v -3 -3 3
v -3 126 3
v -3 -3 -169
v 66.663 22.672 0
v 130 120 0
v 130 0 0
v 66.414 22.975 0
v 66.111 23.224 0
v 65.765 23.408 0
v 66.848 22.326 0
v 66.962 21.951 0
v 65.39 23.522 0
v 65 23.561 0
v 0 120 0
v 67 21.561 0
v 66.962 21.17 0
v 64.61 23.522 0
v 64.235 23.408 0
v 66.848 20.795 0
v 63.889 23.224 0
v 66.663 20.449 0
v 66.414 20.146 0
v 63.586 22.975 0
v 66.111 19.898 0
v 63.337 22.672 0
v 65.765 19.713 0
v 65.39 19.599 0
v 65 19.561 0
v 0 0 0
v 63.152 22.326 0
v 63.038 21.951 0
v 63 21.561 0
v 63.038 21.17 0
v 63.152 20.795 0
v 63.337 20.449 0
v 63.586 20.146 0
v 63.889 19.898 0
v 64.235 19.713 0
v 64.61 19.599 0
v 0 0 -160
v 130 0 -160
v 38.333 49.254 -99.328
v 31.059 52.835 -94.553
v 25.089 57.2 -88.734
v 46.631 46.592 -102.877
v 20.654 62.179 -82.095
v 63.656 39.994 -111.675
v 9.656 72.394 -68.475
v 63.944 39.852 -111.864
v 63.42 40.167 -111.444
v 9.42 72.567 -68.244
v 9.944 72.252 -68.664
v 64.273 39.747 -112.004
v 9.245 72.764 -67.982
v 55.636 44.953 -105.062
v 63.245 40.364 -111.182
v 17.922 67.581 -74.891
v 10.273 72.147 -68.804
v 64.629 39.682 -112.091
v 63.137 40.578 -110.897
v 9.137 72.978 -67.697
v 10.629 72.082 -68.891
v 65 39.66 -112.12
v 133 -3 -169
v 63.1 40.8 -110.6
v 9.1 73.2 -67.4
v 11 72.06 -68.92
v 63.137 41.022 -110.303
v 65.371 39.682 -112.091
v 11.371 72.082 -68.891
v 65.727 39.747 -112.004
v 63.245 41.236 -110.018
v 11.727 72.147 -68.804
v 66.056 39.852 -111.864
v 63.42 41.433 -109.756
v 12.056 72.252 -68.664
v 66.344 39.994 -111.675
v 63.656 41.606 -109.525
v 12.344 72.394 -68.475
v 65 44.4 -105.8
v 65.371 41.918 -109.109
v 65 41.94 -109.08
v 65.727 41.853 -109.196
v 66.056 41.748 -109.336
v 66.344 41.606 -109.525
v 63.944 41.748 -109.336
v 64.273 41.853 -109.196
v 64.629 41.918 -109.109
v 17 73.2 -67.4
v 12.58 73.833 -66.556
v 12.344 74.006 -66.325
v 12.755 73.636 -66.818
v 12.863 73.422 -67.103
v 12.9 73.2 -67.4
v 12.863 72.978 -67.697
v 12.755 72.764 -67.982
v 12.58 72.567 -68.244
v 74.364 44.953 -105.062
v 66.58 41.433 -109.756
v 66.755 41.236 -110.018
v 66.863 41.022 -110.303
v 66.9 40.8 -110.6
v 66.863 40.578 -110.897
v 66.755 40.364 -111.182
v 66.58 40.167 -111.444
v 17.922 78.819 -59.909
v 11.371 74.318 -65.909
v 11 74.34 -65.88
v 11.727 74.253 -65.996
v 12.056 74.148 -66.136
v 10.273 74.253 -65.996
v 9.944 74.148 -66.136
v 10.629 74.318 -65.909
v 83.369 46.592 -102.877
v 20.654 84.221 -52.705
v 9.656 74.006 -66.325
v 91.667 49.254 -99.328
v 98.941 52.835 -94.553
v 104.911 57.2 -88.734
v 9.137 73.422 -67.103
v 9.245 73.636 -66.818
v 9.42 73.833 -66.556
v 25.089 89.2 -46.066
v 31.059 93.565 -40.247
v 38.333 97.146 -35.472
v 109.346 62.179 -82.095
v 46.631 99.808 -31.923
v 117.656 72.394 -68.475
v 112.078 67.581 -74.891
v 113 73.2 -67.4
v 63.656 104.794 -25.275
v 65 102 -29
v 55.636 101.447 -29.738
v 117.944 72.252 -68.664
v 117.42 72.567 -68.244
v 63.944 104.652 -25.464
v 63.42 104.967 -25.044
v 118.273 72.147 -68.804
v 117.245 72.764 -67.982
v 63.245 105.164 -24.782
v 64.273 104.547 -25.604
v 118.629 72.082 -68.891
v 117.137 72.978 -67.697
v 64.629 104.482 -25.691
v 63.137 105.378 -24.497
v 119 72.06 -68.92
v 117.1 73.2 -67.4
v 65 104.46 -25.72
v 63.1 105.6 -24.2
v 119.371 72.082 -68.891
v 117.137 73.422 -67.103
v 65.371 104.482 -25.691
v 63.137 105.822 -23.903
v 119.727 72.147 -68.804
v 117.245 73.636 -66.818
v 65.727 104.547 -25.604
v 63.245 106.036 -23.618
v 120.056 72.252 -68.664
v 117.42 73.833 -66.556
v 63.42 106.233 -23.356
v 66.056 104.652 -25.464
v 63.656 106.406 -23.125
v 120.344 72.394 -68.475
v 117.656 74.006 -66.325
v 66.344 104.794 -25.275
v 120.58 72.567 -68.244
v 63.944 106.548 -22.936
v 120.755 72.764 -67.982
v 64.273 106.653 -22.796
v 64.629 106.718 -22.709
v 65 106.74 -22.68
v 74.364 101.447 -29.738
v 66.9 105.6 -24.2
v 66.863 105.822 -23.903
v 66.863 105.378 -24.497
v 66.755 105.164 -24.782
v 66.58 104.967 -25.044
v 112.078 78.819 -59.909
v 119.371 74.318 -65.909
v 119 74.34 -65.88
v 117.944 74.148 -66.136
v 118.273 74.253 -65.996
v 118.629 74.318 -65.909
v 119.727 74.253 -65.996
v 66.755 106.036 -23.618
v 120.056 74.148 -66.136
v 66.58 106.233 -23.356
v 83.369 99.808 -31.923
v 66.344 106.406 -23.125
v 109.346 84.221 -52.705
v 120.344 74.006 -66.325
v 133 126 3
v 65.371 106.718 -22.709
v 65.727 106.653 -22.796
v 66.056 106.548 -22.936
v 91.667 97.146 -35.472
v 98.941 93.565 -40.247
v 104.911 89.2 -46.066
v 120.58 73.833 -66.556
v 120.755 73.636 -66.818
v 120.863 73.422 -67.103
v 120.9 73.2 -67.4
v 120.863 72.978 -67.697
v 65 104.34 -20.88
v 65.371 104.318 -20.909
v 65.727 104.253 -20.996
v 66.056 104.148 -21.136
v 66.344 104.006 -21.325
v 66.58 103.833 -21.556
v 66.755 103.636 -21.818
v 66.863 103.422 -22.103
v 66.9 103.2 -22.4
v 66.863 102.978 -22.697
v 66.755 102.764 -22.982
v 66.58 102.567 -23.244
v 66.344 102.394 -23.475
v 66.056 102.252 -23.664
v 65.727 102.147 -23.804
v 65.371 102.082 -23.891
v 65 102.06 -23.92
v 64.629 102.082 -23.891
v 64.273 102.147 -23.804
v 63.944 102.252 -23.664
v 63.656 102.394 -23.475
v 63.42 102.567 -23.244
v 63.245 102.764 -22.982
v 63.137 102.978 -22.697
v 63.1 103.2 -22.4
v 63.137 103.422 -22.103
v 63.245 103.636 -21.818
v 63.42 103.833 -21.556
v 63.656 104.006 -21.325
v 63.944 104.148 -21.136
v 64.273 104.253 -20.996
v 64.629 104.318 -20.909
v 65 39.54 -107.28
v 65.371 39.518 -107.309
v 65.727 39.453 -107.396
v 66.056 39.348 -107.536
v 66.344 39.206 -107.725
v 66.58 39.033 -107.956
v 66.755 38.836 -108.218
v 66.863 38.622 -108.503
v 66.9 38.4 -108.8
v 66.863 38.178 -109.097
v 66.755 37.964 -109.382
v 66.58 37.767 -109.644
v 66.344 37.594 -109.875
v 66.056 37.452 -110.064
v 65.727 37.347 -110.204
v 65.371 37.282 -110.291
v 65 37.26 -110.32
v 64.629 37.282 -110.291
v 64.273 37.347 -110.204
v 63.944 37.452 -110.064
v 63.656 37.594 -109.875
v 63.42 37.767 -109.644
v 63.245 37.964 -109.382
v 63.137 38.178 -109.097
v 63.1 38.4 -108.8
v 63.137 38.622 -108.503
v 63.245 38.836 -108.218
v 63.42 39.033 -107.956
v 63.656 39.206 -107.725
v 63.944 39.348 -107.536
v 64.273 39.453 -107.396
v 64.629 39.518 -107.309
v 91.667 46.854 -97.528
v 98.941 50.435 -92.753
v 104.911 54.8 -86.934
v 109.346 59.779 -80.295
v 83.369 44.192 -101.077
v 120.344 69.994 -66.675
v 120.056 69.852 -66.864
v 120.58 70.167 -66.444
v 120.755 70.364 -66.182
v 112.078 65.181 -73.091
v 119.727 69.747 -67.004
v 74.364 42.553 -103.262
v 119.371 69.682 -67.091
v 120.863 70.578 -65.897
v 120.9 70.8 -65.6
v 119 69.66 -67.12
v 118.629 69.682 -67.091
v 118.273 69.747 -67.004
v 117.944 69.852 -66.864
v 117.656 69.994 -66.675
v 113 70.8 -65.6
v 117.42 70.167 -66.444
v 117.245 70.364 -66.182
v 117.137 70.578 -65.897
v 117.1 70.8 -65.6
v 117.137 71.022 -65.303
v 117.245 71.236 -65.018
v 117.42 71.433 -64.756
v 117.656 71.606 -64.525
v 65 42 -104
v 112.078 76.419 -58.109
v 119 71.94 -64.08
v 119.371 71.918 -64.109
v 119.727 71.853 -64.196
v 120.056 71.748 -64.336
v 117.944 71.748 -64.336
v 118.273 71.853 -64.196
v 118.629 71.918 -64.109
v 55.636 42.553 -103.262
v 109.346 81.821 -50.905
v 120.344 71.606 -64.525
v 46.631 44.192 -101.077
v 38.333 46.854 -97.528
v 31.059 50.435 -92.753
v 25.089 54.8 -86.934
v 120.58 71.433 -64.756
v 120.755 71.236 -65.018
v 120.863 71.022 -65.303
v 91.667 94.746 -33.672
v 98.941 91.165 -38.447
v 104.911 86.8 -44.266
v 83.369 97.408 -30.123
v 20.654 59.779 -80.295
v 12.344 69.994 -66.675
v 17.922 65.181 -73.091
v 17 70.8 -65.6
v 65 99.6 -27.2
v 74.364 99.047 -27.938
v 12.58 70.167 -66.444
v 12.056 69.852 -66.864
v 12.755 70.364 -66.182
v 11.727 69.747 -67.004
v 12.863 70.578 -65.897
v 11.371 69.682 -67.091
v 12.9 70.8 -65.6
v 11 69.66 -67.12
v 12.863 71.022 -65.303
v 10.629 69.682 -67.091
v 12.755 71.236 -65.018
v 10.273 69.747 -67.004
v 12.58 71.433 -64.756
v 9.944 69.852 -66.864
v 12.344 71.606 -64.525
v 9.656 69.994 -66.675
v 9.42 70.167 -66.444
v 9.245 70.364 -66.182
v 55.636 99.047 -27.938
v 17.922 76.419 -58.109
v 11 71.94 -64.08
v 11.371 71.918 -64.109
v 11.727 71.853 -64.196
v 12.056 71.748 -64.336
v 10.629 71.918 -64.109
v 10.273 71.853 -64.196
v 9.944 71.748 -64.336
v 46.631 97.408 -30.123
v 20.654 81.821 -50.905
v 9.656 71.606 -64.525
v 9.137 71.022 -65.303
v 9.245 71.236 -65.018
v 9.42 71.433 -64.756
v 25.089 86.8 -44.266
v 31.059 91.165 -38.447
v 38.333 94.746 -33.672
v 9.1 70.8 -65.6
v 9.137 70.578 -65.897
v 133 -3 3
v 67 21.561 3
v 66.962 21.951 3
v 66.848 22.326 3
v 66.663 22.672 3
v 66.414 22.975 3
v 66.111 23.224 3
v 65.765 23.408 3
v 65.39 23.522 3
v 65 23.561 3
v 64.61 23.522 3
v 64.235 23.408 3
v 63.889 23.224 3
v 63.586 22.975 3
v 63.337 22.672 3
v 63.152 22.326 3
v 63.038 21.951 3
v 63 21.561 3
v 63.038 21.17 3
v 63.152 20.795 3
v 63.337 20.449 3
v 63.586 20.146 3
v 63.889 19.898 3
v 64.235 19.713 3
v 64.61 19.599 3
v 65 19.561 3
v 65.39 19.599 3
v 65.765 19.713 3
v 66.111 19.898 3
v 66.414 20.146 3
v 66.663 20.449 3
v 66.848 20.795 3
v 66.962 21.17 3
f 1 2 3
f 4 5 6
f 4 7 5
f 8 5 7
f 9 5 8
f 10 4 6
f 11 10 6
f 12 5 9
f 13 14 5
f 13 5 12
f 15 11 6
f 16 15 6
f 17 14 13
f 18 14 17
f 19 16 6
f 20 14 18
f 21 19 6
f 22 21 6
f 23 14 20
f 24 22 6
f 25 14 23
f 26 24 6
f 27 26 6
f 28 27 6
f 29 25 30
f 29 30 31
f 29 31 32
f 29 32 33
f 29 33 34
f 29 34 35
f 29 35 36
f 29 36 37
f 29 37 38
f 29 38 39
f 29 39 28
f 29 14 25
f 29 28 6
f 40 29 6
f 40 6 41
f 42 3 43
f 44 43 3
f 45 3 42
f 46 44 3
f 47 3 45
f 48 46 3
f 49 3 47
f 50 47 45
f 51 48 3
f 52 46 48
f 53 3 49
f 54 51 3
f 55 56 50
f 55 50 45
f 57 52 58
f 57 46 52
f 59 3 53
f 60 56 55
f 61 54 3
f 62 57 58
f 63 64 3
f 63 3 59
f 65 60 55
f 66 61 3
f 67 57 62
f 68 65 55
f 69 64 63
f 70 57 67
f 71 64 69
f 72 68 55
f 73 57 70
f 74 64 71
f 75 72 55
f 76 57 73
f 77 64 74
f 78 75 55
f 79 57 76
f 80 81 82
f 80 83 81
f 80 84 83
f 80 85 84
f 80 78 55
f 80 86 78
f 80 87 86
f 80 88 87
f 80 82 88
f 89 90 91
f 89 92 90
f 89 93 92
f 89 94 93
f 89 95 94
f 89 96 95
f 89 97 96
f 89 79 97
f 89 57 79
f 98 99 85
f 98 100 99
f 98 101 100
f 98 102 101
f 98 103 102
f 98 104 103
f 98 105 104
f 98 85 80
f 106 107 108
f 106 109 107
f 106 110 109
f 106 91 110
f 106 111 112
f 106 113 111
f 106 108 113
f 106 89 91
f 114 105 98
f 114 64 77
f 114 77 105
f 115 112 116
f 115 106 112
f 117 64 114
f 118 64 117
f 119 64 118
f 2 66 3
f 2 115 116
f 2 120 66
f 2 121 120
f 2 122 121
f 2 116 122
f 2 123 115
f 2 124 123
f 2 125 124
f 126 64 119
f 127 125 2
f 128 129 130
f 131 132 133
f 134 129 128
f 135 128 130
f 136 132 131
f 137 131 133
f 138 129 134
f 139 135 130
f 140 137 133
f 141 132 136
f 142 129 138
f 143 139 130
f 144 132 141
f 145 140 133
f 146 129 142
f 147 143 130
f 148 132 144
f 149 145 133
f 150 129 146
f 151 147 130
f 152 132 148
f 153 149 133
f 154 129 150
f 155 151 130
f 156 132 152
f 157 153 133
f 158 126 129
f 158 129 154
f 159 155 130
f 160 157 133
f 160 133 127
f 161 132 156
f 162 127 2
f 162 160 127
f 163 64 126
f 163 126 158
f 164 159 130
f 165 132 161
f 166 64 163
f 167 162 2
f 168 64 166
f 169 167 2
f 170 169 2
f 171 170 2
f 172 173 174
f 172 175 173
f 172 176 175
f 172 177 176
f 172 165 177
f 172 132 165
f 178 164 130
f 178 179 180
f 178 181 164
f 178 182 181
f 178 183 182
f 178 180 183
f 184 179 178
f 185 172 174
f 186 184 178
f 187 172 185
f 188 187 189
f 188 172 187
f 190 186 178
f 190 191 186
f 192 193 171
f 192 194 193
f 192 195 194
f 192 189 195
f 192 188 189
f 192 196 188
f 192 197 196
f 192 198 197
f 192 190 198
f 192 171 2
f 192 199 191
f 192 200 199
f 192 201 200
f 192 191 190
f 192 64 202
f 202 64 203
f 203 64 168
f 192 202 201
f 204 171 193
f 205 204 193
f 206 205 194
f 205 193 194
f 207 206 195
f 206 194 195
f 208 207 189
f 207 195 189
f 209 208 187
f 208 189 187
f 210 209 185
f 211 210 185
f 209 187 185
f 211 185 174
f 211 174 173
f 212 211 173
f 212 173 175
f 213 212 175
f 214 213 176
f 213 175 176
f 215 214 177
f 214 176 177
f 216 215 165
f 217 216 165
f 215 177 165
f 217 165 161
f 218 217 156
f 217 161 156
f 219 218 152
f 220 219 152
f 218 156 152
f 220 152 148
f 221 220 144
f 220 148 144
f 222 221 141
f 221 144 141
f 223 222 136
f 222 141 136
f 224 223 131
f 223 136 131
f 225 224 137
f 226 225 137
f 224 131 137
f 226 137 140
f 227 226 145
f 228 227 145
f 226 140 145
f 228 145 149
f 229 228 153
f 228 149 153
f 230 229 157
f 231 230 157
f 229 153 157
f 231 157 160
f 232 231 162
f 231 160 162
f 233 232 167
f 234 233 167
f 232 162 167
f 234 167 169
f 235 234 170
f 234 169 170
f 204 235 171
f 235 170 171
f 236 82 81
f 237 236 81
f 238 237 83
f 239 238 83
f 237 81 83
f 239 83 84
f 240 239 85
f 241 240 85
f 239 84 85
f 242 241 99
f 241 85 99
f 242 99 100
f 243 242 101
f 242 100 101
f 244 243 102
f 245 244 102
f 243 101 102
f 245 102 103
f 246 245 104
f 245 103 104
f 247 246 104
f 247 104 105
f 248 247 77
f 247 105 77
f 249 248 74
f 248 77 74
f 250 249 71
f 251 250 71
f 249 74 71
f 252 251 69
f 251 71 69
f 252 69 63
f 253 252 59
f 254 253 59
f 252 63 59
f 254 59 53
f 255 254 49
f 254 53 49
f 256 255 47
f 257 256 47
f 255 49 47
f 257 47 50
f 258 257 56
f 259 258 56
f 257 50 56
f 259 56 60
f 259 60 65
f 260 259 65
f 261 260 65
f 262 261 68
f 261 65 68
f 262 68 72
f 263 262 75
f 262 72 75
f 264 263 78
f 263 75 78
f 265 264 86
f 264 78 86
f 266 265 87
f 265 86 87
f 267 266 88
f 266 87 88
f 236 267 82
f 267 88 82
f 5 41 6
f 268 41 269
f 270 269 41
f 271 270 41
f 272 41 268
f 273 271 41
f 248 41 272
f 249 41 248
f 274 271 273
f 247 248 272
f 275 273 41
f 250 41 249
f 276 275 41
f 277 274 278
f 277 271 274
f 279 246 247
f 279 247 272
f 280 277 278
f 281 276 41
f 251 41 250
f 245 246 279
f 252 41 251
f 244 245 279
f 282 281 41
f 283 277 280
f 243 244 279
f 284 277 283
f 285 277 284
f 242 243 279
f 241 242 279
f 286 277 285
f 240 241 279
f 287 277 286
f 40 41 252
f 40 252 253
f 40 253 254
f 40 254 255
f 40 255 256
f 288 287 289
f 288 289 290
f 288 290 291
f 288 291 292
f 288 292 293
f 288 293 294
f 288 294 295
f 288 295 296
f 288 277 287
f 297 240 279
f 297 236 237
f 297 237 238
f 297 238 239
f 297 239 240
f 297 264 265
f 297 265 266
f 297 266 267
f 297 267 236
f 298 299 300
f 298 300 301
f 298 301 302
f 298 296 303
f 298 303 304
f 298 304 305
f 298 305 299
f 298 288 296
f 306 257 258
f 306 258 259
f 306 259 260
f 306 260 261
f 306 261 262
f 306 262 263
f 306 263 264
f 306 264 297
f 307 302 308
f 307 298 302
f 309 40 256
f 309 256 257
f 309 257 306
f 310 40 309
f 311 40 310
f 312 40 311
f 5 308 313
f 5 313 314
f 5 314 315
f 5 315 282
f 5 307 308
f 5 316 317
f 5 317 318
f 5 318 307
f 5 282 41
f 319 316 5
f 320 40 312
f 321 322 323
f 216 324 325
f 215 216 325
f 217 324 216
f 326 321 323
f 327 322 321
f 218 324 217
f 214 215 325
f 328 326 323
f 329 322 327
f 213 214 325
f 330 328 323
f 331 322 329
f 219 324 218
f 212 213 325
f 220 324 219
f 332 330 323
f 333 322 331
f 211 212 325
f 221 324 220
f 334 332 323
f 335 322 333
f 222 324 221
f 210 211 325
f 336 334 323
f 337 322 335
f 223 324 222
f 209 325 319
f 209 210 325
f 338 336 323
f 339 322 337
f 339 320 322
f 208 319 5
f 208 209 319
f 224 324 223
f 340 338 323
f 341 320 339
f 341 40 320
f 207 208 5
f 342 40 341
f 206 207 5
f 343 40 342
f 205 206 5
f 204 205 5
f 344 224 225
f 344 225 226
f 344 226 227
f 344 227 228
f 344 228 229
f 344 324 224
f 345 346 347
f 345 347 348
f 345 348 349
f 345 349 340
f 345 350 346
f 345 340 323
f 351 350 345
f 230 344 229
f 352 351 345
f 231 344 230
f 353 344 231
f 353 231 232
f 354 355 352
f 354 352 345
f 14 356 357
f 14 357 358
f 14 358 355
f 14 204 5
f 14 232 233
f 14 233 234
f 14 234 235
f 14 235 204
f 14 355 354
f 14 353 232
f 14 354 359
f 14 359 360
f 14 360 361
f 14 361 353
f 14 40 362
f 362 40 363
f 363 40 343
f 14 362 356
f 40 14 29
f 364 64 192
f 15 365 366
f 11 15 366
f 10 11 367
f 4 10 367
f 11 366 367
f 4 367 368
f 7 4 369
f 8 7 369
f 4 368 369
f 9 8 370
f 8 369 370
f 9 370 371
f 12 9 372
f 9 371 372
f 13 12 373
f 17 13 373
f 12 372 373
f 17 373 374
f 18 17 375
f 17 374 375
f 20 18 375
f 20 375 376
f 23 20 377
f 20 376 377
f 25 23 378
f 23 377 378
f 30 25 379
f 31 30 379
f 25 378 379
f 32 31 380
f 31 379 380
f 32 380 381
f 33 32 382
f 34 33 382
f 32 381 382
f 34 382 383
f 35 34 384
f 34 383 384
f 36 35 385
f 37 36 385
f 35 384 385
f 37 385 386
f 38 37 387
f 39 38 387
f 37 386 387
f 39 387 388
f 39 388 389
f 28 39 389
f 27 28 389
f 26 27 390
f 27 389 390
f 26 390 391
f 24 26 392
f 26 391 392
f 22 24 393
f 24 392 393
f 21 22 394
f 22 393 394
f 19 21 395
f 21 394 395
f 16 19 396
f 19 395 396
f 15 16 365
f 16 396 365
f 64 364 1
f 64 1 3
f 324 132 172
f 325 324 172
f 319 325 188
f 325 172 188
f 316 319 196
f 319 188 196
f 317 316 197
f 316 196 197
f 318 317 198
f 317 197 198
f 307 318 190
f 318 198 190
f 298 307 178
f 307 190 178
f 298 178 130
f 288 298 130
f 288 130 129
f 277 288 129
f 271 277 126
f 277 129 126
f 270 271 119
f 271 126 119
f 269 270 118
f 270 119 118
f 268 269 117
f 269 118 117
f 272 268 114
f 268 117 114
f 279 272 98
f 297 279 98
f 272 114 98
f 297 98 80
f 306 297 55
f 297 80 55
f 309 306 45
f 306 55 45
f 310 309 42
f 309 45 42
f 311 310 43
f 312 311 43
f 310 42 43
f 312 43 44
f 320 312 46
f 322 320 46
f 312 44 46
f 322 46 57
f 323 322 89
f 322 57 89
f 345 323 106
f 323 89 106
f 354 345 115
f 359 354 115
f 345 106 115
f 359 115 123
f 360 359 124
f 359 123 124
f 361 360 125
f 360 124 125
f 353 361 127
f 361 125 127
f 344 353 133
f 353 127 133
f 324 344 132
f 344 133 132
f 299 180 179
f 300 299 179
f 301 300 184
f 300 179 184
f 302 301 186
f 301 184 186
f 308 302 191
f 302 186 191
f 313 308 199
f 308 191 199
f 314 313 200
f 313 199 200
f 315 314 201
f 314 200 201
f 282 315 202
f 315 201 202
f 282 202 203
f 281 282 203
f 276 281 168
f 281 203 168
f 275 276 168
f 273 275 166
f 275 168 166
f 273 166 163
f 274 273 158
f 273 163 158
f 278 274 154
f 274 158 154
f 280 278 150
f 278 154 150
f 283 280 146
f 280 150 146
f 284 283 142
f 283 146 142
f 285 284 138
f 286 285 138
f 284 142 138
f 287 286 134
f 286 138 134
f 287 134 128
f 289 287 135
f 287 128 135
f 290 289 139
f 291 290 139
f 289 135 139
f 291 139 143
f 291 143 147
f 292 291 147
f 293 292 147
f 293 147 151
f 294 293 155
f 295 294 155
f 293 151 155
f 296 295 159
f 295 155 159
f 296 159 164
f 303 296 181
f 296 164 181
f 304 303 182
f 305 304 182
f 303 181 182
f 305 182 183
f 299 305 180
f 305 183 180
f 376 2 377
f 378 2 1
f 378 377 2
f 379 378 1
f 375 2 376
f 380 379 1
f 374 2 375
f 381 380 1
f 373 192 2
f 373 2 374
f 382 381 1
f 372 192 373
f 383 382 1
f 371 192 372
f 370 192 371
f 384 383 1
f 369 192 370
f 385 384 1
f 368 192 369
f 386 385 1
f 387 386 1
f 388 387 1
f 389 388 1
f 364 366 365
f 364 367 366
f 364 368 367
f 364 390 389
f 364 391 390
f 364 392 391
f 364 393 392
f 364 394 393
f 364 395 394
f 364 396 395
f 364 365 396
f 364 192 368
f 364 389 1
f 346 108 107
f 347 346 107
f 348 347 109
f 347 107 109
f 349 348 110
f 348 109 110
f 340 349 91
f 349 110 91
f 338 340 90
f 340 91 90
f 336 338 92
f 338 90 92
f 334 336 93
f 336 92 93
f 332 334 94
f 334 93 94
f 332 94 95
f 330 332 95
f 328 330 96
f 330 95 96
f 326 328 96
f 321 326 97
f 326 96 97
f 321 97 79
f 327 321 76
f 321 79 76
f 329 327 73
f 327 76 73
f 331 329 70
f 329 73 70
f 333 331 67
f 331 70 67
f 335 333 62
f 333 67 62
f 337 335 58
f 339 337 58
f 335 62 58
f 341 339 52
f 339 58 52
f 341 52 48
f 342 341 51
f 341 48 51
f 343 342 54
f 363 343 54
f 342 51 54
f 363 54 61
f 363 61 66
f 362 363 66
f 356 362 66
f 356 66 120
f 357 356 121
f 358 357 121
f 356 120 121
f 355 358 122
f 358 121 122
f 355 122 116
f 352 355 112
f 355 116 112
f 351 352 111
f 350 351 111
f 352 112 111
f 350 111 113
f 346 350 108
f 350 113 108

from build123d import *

# Parameters (mm, degrees)
BOSS_EXTRUDE1_DEPTH = 130
SKETCH2_R           = 48
CUT_EXTRUDE1_DEPTH  = 3
SKETCH3_R           = 1.9
CUT_EXTRUDE2_DEPTH  = 3
BOSS_EXTRUDE2_DEPTH = 3
BOSS_EXTRUDE3_DEPTH = 3
SKETCH6_R           = 2
CUT_EXTRUDE3_DEPTH  = 3


with BuildPart() as part:
    # Sketch1 → Boss-Extrude1 (new body)
    with BuildSketch(Plane(origin=(0, 0, 0), x_dir=(0, 0, -1), z_dir=(1, 0, 0))):
        Polygon((-3, 126), (169, -3), (-3, -3), align=None)
        Polygon((0, 0), (160, 0), (0, 120), align=None, mode=Mode.SUBTRACT)
    extrude(amount=BOSS_EXTRUDE1_DEPTH)

    # Sketch2 → Cut-Extrude1 (cut)
    with BuildSketch(Plane(origin=(0, 79.2, -59.4), x_dir=(1, 0, 0), z_dir=(0, 0.7999999999999998, -0.6000000000000002))):
        with Locations(Location((65, 10, 0), (0, 0, 270))):
            Circle(SKETCH2_R)
    extrude(amount=-CUT_EXTRUDE1_DEPTH, mode=Mode.SUBTRACT)

    # Sketch3 → Cut-Extrude2 (cut)
    with BuildSketch(Plane(origin=(0, 79.2, -59.4), x_dir=(1, 0, 0), z_dir=(0, 0.7999999999999998, -0.6000000000000002))):
        with Locations(Location((11, 10, 0), (0, 0, 270))):
            Circle(SKETCH3_R)
        with Locations(Location((65, -44, 0), (0, 0, 270))):
            Circle(SKETCH3_R)
        with Locations(Location((119, 10, 0), (0, 0, 270))):
            Circle(SKETCH3_R)
        with Locations(Location((65, 64, 0), (0, 0, 270))):
            Circle(SKETCH3_R)
    extrude(amount=-CUT_EXTRUDE2_DEPTH, mode=Mode.SUBTRACT)

    # Sketch4 → Boss-Extrude2 (add)
    with BuildSketch(Plane(origin=(130, 0, 0), x_dir=(0, 0, -1), z_dir=(1, 0, 0))):
        Polygon((-3, -3), (-3, 126), (169, -3), align=None)
    extrude(amount=BOSS_EXTRUDE2_DEPTH)

    # Sketch5 → Boss-Extrude3 (add)
    with BuildSketch(Plane.ZY):
        Polygon((3, 126), (3, -3), (-169, -3), align=None)
    extrude(amount=BOSS_EXTRUDE3_DEPTH)

    # Sketch6 → Cut-Extrude3 (cut)
    with BuildSketch(Plane.XY.offset(3)):
        with Locations((65, 21.56057542)):
            Circle(SKETCH6_R)
    extrude(amount=-CUT_EXTRUDE3_DEPTH, mode=Mode.SUBTRACT)


solid = part.part
